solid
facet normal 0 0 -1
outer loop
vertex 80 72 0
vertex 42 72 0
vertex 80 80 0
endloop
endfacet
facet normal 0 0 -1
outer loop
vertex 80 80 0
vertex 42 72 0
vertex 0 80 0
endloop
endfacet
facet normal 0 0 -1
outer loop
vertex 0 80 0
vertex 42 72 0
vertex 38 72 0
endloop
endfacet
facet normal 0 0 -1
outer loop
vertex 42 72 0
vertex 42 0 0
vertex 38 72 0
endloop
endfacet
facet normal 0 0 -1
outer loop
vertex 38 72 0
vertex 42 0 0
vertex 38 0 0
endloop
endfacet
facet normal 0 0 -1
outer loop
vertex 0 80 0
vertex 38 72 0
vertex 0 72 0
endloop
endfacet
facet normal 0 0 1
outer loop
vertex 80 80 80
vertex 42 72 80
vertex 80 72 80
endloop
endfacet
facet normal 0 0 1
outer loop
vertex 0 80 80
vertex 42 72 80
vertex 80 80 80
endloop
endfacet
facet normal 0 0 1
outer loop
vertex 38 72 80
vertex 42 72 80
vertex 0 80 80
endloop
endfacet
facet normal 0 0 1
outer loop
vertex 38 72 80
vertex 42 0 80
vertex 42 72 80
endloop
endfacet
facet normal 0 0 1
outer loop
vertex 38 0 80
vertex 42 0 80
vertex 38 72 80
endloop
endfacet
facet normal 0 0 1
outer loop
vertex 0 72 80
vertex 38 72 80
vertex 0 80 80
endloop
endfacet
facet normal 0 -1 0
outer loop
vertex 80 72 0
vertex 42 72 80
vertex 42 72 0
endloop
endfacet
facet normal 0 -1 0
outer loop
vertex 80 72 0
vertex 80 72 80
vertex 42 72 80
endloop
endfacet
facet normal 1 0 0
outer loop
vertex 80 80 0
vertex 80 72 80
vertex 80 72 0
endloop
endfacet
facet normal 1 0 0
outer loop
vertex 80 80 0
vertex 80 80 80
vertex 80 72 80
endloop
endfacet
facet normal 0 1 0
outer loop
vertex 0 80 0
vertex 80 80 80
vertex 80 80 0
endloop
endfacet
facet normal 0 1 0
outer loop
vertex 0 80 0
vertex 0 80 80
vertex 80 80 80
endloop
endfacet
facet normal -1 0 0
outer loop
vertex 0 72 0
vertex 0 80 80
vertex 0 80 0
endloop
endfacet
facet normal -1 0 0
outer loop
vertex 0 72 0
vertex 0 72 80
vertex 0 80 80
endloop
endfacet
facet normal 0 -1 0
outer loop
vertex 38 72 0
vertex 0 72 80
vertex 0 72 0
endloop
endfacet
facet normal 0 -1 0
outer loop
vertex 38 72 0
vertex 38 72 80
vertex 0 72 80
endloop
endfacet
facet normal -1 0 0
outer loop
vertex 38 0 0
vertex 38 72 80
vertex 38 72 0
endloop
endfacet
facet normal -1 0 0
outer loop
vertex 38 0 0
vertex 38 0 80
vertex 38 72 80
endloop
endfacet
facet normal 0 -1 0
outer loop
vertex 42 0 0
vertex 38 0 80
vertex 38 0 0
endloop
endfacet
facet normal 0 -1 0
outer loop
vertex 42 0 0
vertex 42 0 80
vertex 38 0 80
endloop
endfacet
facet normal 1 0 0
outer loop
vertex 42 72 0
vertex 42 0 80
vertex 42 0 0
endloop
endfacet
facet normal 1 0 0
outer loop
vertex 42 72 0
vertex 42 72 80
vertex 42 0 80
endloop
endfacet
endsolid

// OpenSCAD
$fn = 32;

// ----------------------------------------------------------------------
// Structural section: tee 80 x 80 mm
// ----------------------------------------------------------------------

// --- parameters (mm) ---
sec_w = 80;               // tee width, X
sec_h = 80;               // tee height, Y
flange_t = 8;             // top flange thickness
web_t = 4;                // web thickness
plate_t = 80;             // cut length, Z (extrusion height)

profile = [[38, 0], [42, 0], [42, 72], [80, 72], [80, 80], [0, 80], [0, 72], [38, 72]];  // primary outline, 8 points, counter clockwise

// --- the one profile operation ---
linear_extrude(height = plate_t) polygon(points = profile);
